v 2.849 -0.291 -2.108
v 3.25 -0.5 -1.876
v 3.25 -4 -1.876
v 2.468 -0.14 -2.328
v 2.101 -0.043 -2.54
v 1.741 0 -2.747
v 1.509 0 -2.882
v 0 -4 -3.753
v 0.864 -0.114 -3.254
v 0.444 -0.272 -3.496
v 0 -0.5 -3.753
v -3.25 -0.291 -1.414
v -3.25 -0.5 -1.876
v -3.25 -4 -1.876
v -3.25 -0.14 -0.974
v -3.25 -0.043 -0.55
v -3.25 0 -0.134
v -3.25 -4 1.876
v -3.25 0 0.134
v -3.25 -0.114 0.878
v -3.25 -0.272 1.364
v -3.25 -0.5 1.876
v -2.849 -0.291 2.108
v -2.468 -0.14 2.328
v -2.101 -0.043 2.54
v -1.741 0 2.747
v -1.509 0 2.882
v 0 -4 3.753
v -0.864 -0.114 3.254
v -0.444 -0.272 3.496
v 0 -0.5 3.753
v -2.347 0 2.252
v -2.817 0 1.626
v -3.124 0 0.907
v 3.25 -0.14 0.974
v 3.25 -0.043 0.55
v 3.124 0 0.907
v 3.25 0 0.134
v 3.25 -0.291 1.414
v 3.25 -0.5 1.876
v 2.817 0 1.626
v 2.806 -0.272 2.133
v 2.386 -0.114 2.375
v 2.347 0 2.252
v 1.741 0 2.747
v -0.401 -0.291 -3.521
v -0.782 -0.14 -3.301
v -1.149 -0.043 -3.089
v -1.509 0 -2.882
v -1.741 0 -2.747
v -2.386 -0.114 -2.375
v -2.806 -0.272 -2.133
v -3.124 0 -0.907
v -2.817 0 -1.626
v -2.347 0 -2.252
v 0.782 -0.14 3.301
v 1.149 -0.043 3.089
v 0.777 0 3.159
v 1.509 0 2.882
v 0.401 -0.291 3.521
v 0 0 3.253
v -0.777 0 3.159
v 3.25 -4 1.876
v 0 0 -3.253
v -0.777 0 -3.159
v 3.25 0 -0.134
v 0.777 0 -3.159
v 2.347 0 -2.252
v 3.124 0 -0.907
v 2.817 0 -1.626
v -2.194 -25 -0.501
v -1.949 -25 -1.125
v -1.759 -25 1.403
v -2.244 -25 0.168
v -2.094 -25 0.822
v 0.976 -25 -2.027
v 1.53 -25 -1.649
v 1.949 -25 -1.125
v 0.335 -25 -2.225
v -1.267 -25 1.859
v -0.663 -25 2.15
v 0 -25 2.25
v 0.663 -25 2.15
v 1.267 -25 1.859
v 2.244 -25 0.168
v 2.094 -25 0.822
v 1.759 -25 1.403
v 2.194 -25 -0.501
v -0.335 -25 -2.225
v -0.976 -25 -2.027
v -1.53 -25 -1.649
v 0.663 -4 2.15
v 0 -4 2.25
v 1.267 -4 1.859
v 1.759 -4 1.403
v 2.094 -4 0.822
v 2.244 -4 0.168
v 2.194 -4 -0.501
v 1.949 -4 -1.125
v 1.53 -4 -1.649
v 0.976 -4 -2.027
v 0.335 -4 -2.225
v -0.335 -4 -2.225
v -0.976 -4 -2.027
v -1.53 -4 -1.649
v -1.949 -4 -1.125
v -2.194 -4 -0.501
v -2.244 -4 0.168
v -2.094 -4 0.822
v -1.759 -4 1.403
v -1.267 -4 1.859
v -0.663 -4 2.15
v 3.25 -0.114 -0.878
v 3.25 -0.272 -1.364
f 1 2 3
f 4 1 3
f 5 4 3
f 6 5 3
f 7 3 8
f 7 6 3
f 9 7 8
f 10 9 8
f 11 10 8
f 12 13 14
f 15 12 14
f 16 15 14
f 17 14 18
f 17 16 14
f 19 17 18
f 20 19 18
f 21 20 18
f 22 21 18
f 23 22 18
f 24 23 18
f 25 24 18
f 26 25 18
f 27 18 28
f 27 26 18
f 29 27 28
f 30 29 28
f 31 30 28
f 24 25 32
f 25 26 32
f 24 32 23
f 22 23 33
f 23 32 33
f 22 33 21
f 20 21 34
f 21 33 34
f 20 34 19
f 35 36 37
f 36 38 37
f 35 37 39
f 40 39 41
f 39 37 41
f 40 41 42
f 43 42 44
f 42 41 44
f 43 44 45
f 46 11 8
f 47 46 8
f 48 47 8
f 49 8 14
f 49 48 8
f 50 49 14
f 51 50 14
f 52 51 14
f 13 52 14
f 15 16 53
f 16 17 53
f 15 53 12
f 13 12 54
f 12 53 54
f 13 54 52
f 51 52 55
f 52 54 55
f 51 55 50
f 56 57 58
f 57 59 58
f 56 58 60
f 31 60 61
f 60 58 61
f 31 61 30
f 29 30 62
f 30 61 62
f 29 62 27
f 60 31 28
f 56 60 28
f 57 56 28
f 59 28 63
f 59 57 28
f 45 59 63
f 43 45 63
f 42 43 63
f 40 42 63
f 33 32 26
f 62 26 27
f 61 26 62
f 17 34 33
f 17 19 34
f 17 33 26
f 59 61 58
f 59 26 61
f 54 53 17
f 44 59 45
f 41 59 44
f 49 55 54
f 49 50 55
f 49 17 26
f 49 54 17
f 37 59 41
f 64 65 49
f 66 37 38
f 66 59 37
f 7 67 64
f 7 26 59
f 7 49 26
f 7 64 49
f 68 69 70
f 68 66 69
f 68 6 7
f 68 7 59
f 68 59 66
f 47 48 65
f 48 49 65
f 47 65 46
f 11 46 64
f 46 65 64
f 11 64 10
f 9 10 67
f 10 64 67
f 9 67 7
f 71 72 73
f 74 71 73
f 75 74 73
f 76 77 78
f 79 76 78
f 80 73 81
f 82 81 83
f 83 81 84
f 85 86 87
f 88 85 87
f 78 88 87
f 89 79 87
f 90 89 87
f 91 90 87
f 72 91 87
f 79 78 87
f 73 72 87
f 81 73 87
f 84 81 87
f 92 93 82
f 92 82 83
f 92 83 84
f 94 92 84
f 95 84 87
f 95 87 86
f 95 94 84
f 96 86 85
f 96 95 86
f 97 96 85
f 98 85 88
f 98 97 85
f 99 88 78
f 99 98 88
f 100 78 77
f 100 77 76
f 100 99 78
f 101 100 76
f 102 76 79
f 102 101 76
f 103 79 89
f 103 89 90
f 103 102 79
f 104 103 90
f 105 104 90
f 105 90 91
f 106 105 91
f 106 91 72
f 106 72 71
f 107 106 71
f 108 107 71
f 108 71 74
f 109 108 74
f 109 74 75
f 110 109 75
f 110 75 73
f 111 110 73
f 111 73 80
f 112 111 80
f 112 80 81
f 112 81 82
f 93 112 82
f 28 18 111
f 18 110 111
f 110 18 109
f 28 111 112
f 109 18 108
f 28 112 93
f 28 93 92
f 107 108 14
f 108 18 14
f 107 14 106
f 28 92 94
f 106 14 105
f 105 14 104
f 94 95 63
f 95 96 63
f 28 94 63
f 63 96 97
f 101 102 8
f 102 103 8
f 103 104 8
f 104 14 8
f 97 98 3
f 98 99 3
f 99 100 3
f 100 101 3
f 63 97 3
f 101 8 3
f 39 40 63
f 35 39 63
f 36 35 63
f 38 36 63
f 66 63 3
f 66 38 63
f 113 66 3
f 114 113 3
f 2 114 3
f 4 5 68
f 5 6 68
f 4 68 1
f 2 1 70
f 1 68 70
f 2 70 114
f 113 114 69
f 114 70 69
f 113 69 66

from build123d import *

# Parameters (mm, degrees)
SKETCH2_R           = 2.25
BOSS_EXTRUDE1_DEPTH = 25
BOSS_EXTRUDE3_DEPTH = 4


with BuildPart() as part:
    # Sketch2 → Boss-Extrude1 (new body)
    with BuildSketch(Plane(origin=(0, 0, 0), x_dir=(1, 0, 0), z_dir=(0, 1, 0))):
        with Locations(Location((0, 0, 0), (0, 0, 270))):
            Circle(SKETCH2_R)
    extrude(amount=-BOSS_EXTRUDE1_DEPTH)

    # Sketch3 → Boss-Extrude3 (add)
    with BuildSketch(Plane(origin=(0, 0, 0), x_dir=(1, 0, 0), z_dir=(0, 1, 0))):
        Polygon((0, 3.75277675), (-3.25, 1.876388375), (-3.25, -1.876388375), (0, -3.75277675), (3.25, -1.876388375), (3.25, 1.876388375), align=None)
    extrude(amount=-BOSS_EXTRUDE3_DEPTH)

    # Sketch5 → Cut-Revolve2 (revolve, cut)
    with BuildSketch(Plane(origin=(0, 0, 0), x_dir=(0, 0, -1), z_dir=(1, 0, 0))):
        Polygon((3.25277675, 0), (3.75277675, 0), (3.75277675, -0.5), align=None)
    revolve(axis=Axis((0, 0, 0), (0, -1, 0)), mode=Mode.SUBTRACT)


solid = part.part
